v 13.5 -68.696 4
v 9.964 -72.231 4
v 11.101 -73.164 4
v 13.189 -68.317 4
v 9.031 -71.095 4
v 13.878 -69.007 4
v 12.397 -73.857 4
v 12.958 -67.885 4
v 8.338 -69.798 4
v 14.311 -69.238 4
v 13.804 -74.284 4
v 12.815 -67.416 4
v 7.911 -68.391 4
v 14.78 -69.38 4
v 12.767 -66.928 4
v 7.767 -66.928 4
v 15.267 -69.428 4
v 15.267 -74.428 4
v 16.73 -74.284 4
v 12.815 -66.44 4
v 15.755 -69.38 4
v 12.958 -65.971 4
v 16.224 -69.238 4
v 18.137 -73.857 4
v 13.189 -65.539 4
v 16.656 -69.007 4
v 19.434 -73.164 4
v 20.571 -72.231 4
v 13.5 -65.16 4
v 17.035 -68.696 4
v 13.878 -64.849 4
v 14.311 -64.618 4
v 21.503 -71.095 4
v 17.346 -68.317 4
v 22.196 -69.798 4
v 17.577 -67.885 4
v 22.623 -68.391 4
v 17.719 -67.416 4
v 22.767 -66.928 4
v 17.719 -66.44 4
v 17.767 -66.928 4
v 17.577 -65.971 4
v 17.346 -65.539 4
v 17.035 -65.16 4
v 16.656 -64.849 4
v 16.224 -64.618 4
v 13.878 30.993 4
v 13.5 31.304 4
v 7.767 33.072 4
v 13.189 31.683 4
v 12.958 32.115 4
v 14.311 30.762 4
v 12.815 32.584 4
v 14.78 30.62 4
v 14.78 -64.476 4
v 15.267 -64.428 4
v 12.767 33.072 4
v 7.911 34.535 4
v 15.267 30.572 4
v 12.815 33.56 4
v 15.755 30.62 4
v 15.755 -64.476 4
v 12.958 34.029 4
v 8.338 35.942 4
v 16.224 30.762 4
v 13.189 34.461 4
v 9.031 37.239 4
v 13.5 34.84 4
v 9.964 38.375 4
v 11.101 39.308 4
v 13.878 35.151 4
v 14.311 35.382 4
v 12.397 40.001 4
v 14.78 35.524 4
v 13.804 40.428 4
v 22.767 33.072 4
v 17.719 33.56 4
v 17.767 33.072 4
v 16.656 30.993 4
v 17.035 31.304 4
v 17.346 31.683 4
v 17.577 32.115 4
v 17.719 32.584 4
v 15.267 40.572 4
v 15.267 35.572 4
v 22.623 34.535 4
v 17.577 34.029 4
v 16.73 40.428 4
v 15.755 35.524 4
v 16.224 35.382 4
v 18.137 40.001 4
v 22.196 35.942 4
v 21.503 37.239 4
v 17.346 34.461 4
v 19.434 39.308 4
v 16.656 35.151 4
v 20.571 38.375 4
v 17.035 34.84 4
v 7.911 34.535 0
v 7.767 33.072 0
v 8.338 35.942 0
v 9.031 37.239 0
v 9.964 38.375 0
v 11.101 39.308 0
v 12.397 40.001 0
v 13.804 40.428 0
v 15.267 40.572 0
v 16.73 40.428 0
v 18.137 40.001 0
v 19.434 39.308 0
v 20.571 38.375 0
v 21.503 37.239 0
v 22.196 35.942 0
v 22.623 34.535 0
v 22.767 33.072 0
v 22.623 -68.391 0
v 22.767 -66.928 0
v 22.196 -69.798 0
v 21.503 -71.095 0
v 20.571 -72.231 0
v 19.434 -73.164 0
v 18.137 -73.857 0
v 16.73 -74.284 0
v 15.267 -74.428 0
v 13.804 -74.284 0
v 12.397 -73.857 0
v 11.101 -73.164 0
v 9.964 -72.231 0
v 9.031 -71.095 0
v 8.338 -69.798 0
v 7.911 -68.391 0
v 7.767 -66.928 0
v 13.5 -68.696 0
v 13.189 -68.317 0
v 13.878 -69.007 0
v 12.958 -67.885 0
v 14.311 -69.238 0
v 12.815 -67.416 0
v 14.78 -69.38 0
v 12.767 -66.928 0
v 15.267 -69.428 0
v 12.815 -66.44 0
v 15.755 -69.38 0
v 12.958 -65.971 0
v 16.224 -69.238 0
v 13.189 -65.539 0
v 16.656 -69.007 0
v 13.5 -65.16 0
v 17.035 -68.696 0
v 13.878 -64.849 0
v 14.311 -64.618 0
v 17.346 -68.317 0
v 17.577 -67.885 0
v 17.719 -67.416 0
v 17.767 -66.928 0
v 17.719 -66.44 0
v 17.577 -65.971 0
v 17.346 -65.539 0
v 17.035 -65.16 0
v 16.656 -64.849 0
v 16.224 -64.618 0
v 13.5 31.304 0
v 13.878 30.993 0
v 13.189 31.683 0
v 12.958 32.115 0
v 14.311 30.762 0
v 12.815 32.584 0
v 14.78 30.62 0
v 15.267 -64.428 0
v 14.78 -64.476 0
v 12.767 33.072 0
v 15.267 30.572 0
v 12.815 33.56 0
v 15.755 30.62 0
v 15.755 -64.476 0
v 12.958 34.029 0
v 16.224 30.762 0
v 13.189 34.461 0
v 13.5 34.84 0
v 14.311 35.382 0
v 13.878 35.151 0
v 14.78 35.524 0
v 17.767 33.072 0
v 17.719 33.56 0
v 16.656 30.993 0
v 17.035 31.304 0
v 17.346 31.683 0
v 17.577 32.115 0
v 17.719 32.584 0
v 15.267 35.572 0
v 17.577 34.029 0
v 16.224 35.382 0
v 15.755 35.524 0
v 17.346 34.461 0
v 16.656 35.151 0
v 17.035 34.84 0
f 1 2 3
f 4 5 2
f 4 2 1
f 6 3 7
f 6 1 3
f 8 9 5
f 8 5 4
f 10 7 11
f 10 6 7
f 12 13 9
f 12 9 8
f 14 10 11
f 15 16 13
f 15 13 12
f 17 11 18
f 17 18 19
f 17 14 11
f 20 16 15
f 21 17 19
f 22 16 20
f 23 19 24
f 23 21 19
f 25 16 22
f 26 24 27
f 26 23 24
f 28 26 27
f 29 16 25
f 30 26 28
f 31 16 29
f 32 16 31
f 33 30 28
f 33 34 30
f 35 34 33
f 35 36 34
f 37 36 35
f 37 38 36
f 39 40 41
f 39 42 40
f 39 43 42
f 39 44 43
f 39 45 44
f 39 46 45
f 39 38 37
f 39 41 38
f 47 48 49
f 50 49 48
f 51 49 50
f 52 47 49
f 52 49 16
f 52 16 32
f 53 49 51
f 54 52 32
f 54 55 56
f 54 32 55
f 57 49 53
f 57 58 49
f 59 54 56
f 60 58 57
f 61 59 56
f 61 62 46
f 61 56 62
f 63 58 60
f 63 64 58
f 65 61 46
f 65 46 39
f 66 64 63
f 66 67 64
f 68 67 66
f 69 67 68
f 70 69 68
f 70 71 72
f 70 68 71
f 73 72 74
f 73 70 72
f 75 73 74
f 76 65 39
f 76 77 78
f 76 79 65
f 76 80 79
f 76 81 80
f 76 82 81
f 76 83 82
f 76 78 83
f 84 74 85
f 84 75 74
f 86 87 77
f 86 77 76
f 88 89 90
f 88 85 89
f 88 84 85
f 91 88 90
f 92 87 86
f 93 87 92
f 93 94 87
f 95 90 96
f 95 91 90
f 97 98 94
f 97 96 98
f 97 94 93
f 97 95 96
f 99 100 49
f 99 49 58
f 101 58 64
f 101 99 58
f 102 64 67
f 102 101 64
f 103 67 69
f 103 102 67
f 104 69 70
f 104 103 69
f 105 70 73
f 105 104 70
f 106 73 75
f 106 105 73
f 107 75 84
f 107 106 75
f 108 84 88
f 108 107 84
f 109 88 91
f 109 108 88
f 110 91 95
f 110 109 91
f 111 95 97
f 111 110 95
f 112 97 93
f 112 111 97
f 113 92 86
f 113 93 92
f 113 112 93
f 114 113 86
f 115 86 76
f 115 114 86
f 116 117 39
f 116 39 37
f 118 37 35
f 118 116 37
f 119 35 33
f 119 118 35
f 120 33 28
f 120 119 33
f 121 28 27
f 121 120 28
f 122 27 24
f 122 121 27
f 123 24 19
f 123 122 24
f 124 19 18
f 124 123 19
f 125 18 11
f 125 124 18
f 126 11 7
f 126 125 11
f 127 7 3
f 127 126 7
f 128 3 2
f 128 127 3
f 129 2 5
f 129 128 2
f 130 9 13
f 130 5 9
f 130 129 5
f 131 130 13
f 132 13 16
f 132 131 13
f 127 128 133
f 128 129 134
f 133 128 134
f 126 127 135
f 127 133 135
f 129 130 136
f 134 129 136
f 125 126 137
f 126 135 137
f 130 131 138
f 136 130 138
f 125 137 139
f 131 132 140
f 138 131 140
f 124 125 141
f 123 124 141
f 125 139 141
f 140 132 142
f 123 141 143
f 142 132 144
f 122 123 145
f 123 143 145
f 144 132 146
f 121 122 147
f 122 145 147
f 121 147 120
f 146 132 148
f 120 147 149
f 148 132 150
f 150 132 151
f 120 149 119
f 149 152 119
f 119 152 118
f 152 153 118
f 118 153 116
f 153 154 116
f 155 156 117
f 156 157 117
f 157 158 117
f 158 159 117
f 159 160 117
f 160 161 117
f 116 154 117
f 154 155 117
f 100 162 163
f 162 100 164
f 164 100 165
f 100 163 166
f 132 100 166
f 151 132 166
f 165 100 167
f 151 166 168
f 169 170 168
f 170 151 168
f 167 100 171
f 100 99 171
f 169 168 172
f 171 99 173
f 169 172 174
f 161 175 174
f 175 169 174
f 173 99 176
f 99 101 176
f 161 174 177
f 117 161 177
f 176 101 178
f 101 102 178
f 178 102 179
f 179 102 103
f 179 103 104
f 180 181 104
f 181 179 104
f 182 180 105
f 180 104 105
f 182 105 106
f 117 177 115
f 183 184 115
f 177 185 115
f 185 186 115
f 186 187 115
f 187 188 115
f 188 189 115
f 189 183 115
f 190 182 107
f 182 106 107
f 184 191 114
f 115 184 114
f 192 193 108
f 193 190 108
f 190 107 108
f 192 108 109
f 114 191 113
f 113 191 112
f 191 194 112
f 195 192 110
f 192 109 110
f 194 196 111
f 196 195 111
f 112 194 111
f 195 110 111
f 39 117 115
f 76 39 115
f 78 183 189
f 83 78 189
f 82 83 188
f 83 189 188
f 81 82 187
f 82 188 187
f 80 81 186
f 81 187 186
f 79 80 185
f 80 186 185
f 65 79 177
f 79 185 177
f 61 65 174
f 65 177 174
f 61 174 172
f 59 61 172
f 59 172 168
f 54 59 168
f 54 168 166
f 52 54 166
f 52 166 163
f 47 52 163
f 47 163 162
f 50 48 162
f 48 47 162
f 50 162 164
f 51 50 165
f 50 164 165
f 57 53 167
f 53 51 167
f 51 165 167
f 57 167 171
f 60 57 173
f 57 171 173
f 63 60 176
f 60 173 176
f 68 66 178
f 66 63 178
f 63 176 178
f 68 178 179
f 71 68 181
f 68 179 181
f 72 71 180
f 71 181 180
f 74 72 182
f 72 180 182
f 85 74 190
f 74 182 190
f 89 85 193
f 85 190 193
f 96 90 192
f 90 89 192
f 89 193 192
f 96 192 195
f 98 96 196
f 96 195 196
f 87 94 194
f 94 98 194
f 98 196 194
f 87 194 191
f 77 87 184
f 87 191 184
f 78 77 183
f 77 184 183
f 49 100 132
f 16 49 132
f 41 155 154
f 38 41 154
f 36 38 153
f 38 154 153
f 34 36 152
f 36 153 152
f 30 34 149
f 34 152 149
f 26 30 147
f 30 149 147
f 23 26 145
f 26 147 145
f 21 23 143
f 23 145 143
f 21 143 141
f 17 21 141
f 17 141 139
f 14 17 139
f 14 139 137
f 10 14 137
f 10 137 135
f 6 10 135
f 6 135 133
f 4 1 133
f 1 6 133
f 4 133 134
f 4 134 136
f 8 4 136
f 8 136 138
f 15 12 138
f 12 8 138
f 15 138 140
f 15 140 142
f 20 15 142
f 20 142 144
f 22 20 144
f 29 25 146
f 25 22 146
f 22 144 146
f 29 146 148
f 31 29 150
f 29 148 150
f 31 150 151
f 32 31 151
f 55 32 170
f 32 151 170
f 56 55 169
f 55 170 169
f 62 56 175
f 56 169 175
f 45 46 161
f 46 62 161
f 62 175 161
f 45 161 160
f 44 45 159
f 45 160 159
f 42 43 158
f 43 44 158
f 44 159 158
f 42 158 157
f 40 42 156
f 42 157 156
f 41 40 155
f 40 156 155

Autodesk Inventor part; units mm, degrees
ref_plane "YZ Plane" through (0, 0, 0) normal (1, 0, 0) x (0, 1, 0)
ref_plane "XZ Plane" through (0, 0, 0) normal (0, 1, 0) x (-1, 0, 0)
ref_plane "XY Plane" through (0, 0, 0) normal (0, 0, 1) x (1, 0, 0)
sketch "Sketch1" plane through (0, 0, 0) normal (0, 0, 1) x (1, 0, 0)
  line L0 (15.2673, 33.0721) -> (15.2673, -66.9279) construction
  line L1 (7.7673, 33.0721) -> (7.7673, -66.9279)
  line L2 (22.7673, -66.9279) -> (22.7673, 33.0721)
  arc A0 (22.7673, 33.0721) -> (7.7673, 33.0721) centre (15.2673, 33.0721) ccw
  arc A1 (7.7673, -66.9279) -> (22.7673, -66.9279) centre (15.2673, -66.9279) ccw
  circle A2 centre (15.2673, 33.0721) radius 2.5
  circle A3 centre (15.2673, -66.9279) radius 2.5
  point P0 (0, 0)
  point P1 (15.2673, -16.9279)
  dimension "d0" = 100
  dimension "d1" = 15
  dimension "d2" = 5
extrude "Extrusion1" add sketch "Sketch1" along normal blind 4
sketch "Sketch2" plane through (0, 0, 4) normal (0, 0, 1) x (1, 0, 0)
  point P0 (0, 0)
properties part number "2nd_part[1]"
